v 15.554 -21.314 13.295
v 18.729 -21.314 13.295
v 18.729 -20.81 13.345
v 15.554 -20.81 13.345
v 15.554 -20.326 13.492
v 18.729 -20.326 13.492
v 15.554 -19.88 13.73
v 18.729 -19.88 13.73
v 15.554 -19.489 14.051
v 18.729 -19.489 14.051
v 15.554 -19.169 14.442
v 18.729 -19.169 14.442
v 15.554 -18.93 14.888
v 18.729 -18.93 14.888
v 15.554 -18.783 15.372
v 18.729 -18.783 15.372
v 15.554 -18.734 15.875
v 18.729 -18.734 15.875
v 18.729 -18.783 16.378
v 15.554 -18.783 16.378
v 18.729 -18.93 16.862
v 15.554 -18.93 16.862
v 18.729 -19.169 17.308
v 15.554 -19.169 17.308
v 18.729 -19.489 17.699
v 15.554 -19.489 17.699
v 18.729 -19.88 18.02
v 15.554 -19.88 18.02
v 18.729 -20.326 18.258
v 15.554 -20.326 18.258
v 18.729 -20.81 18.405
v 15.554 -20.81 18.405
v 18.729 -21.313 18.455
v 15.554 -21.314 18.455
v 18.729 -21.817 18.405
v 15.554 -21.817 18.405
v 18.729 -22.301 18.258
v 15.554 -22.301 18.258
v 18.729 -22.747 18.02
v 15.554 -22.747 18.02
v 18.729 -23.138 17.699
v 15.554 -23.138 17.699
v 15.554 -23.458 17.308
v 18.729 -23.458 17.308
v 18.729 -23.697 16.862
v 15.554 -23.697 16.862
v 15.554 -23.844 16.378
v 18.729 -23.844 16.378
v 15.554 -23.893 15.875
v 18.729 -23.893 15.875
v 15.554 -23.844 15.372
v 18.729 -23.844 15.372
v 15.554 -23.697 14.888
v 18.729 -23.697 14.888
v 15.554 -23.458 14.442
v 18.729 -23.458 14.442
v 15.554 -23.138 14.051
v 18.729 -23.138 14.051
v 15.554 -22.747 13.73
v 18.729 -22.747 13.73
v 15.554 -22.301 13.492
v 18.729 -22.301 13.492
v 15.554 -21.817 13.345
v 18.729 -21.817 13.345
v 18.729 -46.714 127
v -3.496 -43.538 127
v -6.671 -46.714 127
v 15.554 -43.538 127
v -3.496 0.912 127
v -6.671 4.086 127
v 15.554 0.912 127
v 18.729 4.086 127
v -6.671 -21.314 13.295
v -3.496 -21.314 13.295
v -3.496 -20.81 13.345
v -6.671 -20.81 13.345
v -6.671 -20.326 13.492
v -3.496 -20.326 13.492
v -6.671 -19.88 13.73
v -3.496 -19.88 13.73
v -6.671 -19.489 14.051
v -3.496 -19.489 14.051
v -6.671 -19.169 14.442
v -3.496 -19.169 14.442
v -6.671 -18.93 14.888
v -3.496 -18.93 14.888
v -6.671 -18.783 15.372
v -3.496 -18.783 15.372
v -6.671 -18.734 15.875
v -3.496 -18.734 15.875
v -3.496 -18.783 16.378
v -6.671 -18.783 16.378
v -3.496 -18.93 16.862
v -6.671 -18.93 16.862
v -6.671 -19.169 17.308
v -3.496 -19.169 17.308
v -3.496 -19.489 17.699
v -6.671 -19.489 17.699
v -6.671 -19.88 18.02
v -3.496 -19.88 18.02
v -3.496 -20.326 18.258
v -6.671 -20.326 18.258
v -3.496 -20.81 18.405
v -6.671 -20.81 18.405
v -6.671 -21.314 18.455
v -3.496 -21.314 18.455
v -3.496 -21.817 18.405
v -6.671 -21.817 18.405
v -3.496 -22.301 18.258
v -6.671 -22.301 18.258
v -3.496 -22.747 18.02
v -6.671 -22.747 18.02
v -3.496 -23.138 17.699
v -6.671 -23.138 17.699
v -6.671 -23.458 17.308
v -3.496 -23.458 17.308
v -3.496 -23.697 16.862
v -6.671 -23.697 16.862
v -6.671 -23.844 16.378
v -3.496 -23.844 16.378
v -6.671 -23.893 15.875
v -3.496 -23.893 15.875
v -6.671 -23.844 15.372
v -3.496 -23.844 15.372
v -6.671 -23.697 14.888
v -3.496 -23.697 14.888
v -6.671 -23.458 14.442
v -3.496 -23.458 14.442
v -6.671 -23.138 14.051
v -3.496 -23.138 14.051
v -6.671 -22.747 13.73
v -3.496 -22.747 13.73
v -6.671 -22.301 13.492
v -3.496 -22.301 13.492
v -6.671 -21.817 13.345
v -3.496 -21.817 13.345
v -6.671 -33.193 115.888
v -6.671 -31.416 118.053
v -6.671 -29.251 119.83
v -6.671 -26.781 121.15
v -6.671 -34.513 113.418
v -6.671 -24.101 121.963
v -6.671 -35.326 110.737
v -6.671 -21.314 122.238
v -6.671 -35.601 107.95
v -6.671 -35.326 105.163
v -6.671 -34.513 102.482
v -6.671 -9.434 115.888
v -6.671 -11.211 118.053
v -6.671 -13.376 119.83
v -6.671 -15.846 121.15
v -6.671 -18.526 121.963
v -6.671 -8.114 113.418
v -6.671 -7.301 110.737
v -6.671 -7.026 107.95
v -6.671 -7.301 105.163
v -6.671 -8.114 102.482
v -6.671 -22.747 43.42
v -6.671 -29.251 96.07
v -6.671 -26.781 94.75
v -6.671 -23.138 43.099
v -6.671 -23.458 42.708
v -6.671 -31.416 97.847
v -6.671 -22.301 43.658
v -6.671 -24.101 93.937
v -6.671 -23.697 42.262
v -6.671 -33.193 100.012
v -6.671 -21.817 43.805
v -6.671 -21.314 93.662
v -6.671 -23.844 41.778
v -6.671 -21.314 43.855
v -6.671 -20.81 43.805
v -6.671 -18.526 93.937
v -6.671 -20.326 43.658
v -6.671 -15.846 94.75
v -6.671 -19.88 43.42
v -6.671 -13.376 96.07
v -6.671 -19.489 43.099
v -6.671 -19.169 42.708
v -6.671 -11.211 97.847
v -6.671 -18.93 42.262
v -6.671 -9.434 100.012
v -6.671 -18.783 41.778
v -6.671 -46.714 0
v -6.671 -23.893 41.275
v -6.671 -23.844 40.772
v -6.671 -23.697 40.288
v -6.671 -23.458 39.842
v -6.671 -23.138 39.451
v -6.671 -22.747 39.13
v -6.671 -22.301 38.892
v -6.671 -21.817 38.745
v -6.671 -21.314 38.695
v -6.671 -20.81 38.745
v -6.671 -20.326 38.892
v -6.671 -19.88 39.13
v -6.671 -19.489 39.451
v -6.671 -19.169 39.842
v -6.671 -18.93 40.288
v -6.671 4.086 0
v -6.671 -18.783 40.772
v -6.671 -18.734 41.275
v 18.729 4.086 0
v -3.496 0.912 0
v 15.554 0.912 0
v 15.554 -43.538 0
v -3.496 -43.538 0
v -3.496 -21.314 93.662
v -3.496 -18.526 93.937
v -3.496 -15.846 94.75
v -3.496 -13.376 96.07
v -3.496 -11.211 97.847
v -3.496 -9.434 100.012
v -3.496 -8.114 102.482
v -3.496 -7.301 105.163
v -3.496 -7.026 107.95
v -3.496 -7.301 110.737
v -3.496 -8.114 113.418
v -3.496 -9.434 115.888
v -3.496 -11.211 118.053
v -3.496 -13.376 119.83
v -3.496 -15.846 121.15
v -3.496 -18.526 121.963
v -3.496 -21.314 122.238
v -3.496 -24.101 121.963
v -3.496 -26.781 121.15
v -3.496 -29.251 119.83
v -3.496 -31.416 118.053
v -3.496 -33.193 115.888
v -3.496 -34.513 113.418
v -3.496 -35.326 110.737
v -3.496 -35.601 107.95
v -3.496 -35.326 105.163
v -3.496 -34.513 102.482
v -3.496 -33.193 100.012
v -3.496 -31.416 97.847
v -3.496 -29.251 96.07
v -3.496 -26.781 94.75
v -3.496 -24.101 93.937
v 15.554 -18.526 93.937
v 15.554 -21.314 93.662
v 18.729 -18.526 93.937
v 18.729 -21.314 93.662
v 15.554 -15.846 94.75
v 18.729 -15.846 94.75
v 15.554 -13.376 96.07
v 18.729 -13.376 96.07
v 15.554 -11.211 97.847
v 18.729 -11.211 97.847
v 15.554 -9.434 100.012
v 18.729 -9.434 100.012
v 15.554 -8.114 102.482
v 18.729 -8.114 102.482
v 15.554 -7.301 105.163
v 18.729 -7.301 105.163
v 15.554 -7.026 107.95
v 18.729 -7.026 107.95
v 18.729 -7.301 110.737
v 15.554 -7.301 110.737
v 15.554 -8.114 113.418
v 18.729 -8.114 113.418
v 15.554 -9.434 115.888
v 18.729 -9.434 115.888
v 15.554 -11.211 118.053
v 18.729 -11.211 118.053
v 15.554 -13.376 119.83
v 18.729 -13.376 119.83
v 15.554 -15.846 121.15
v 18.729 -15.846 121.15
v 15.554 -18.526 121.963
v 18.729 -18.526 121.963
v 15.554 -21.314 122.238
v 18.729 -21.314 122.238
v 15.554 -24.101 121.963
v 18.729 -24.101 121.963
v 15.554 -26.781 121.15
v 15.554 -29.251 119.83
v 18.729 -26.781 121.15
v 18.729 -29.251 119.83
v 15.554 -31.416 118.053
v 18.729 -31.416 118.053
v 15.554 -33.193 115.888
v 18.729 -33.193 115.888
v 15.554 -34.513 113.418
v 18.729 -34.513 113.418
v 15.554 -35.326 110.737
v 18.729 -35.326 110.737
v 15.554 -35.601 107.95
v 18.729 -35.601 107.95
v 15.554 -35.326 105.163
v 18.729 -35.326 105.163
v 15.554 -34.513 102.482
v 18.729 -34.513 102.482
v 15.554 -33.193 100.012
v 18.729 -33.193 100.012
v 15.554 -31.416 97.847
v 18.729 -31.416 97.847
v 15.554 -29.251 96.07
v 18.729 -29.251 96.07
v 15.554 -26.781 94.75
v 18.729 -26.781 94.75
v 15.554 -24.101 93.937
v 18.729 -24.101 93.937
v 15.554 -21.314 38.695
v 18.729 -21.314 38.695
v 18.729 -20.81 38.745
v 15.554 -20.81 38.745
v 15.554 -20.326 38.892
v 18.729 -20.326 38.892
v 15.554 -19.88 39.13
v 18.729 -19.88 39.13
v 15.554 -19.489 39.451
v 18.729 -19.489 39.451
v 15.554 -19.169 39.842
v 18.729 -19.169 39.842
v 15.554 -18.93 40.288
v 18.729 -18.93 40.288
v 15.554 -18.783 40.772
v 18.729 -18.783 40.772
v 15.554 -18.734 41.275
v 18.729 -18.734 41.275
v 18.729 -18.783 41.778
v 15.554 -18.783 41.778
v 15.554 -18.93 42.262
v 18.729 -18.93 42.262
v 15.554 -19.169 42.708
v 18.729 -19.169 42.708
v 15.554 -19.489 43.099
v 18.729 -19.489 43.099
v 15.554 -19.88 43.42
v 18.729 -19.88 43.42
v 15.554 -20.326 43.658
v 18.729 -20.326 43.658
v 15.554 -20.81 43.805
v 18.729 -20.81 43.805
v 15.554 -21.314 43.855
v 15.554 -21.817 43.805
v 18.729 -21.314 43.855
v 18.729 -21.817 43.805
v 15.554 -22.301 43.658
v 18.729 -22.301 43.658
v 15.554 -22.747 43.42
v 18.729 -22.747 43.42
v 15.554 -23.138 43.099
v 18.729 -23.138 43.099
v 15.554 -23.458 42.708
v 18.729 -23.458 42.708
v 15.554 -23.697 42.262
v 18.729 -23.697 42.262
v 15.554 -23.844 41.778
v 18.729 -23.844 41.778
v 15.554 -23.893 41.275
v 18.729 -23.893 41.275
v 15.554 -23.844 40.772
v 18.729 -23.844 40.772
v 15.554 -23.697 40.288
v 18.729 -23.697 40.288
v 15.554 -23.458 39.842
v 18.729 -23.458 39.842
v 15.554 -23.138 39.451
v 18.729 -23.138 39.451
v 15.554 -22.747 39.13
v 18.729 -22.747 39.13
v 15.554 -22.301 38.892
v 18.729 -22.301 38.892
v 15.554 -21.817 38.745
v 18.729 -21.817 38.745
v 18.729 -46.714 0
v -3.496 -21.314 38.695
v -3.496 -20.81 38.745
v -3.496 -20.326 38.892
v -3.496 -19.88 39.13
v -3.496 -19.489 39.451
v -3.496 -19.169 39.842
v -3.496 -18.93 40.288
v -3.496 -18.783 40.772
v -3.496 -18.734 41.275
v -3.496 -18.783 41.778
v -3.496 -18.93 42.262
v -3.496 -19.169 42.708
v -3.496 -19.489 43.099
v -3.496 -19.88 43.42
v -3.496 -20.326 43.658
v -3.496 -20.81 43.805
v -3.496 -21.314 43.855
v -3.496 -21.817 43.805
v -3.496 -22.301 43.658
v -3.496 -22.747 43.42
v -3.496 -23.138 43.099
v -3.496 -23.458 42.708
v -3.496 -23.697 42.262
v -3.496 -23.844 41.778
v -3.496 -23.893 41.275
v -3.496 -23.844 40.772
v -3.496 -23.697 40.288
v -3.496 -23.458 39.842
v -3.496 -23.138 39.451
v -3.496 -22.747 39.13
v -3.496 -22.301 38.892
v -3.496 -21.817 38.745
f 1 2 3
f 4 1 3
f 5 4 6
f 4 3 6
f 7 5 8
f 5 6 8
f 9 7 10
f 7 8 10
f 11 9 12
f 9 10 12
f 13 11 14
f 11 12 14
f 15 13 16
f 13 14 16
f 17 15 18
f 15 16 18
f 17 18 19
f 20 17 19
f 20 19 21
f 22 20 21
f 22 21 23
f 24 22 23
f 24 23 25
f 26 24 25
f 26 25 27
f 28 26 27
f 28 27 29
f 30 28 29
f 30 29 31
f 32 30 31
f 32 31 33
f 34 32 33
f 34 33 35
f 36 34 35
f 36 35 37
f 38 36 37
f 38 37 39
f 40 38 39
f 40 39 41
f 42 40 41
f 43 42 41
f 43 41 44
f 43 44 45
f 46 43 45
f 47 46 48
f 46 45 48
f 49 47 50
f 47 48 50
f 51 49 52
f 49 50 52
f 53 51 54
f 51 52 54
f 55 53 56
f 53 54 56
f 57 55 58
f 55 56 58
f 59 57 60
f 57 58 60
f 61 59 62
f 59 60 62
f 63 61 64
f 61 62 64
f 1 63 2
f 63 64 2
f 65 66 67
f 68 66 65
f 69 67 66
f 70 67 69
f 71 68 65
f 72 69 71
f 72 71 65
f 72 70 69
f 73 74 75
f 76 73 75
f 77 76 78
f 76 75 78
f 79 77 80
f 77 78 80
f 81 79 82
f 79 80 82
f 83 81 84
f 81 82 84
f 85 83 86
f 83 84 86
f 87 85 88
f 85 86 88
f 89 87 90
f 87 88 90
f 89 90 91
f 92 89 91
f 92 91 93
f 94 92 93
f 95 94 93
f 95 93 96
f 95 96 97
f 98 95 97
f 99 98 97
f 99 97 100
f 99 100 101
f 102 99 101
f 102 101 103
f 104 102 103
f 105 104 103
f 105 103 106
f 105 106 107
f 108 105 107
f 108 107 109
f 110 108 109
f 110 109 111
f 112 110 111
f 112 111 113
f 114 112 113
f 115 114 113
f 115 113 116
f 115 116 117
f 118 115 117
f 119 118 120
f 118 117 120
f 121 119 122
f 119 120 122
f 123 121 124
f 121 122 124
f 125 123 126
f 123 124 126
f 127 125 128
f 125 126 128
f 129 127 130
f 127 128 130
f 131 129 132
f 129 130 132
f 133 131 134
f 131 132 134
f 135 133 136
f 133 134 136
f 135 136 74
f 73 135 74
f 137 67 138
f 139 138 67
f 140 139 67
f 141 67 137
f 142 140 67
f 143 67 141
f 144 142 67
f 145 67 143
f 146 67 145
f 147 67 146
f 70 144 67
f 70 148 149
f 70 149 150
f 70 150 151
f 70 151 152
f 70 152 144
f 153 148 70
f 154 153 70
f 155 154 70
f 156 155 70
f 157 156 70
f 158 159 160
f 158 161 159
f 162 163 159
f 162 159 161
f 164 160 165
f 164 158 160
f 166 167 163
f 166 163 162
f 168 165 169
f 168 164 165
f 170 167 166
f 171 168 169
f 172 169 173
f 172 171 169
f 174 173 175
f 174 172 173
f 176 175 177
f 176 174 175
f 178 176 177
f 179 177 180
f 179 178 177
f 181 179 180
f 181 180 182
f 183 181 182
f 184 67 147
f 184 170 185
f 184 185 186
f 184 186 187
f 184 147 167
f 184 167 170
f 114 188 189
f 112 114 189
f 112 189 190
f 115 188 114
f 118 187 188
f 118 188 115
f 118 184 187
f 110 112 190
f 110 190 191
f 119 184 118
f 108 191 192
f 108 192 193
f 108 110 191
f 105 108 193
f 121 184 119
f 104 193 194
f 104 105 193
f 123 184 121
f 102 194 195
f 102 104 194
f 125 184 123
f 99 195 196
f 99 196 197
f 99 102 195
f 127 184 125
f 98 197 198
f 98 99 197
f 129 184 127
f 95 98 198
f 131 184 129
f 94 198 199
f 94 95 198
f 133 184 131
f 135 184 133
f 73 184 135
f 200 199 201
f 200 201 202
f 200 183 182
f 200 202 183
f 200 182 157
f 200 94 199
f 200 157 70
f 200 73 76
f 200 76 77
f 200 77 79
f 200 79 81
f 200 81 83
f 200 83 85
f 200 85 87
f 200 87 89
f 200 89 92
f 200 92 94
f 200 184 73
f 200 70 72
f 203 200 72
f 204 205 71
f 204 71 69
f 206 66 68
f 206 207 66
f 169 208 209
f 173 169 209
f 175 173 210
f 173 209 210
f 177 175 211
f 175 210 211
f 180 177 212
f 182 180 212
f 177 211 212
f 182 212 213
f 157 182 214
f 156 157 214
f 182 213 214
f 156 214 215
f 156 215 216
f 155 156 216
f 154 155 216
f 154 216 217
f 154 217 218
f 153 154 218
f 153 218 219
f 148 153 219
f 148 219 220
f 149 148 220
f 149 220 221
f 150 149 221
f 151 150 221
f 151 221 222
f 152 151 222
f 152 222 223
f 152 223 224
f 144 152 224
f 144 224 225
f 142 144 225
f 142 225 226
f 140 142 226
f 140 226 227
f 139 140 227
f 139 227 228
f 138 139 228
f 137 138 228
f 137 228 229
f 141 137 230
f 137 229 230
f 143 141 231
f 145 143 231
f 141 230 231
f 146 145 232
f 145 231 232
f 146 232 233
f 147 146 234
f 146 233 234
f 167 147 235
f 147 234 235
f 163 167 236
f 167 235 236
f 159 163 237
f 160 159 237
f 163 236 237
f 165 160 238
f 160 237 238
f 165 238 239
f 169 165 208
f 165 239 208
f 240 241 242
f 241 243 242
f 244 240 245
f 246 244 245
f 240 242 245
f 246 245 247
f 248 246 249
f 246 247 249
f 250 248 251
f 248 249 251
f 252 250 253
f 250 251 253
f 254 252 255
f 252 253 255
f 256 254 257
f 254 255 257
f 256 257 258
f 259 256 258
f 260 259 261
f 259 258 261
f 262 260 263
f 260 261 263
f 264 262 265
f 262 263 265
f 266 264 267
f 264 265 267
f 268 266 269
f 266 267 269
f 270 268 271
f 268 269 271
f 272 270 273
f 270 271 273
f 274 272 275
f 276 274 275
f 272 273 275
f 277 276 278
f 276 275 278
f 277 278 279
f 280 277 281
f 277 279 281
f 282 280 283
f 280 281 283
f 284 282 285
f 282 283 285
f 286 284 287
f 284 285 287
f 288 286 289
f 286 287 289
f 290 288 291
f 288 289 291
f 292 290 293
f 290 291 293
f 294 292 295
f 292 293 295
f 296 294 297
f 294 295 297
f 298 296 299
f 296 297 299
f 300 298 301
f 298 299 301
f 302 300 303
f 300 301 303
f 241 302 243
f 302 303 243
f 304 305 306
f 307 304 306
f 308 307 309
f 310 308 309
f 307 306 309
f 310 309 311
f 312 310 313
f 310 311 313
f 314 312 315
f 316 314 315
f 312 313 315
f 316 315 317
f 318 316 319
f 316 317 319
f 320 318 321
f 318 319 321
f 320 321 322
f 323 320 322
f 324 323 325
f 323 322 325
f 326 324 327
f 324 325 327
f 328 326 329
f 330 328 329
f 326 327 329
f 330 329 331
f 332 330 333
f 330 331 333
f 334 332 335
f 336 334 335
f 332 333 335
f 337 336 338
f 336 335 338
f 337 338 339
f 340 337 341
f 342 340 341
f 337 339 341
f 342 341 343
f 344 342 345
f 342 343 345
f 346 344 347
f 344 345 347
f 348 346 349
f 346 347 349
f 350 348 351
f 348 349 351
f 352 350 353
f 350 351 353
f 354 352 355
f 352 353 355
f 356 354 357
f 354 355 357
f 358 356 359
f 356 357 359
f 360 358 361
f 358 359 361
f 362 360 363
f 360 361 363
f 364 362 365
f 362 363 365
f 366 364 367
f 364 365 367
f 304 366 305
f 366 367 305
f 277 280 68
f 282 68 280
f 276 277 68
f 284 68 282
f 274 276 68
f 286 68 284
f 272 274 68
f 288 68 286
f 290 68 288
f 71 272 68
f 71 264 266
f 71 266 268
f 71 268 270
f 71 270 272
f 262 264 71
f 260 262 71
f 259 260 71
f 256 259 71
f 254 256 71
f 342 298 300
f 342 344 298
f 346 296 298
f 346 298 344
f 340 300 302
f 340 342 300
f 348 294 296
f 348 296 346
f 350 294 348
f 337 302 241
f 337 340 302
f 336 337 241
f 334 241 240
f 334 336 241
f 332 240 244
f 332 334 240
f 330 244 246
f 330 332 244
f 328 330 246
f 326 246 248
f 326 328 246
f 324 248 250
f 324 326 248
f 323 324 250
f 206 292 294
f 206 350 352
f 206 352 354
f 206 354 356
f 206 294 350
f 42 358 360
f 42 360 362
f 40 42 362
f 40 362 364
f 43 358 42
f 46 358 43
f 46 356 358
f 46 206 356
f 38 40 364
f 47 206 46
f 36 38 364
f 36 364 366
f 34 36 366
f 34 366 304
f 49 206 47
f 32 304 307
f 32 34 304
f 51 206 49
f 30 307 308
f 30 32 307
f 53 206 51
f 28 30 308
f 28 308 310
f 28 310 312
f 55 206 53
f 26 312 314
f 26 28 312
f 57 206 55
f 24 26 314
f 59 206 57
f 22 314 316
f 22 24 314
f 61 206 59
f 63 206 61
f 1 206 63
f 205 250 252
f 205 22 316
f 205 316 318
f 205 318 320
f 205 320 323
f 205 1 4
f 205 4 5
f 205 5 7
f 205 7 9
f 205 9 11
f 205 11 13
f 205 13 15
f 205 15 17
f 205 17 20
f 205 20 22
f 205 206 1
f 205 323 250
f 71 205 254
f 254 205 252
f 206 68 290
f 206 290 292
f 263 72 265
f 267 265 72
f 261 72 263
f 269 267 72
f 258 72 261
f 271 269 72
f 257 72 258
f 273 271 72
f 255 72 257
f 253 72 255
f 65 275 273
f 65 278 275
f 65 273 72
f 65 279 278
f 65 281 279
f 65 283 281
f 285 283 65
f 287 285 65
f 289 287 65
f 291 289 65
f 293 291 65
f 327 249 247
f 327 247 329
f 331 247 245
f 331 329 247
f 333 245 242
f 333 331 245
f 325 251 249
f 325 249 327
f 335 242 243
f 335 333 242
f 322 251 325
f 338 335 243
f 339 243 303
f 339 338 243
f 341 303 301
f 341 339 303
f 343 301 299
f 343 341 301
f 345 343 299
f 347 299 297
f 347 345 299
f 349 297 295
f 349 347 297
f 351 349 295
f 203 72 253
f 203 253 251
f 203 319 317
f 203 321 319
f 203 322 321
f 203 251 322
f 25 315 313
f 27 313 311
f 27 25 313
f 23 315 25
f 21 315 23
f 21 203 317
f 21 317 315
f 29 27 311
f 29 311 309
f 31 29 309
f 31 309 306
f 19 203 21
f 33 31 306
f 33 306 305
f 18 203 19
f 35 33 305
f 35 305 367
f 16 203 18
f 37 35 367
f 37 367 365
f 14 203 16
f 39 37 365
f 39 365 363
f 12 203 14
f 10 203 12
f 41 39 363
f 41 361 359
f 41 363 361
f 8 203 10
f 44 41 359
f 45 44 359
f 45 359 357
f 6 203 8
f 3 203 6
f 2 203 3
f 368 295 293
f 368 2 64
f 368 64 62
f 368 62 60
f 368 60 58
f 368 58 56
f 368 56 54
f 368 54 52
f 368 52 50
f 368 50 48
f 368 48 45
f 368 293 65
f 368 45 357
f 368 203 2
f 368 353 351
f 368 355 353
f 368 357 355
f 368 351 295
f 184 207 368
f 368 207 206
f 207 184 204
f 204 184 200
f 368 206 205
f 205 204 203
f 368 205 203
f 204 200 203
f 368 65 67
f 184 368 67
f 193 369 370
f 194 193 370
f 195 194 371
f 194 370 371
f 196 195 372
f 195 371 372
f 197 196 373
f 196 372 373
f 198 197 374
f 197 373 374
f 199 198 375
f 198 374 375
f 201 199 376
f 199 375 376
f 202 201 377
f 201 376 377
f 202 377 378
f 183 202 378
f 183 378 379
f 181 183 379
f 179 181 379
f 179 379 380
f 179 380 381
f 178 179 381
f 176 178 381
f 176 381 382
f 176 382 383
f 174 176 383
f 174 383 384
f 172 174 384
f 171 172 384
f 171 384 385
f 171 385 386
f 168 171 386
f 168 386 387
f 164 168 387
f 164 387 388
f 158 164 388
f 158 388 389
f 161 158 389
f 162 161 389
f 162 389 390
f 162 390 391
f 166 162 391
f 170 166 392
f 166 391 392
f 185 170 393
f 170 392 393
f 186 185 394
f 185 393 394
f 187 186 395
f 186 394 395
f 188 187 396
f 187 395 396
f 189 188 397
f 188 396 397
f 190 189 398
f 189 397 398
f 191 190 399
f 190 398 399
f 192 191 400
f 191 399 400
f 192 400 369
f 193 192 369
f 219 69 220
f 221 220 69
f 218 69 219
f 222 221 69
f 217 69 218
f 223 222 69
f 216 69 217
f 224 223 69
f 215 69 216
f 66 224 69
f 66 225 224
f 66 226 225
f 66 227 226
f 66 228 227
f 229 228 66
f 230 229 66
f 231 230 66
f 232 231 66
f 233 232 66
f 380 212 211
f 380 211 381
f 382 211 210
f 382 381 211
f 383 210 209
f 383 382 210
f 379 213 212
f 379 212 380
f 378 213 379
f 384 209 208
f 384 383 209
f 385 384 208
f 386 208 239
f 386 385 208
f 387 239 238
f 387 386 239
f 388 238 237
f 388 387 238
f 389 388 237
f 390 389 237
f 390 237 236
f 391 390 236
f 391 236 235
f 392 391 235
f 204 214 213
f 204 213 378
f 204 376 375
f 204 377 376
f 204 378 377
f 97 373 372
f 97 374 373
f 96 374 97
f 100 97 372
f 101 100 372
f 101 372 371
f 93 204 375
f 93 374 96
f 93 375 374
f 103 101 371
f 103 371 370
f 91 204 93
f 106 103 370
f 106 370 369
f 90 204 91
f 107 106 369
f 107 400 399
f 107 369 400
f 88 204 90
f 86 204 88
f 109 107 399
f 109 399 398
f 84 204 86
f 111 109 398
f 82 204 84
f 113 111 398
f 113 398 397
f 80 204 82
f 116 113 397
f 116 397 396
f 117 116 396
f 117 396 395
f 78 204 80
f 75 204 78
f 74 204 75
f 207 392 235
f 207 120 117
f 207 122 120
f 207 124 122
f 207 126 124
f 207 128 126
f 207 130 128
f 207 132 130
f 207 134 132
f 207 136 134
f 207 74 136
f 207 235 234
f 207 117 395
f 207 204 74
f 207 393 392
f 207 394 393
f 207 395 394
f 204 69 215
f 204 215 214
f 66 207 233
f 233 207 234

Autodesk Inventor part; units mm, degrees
ref_plane "YZ Plane" through (0, 0, 0) normal (1, 0, 0) x (0, 1, 0)
ref_plane "XZ Plane" through (0, 0, 0) normal (0, 1, 0) x (-1, 0, 0)
ref_plane "XY Plane" through (0, 0, 0) normal (0, 0, 1) x (1, 0, 0)
sketch "Sketch1" plane through (0, 0, 0) normal (0, 0, 1) x (1, 0, 0)
  line L0 (-6.6707, 4.0865) -> (18.7293, 4.0865)
  line L1 (18.7293, 4.0865) -> (18.7293, -46.7135)
  line L2 (18.7293, -46.7135) -> (-6.6707, -46.7135)
  line L3 (-6.6707, -46.7135) -> (-6.6707, 4.0865)
  line L4 (15.5543, 0.9115) -> (-3.4957, 0.9115)
  line L5 (-3.4957, 0.9115) -> (-3.4957, -43.5385)
  line L6 (-3.4957, -43.5385) -> (15.5543, -43.5385)
  line L7 (15.5543, -43.5385) -> (15.5543, 0.9115)
  point P0 (0, 0)
  dimension "d0" = 25.4
  dimension "d1" = 50.8
  dimension "d2" = 3.175
extrude "Extrusion1" add sketch "Sketch1" along normal blind 127
sketch "Sketch2" plane through (18.7293, -46.7135, 0) normal (1, 0, 0) x (0, 0, -1)
  line L0 (0, 47.625) -> (0, 3.175) projected
  line L1 (0, 25.4) -> (-107.95, 25.4)
  circle A0 centre (-107.95, 25.4) radius 14.2875
  point P0 (0, 46.7135)
  dimension "d5" = 107.95
  dimension "d6" = 28.575
extrude "Extrusion2" cut sketch "Sketch2" against normal blind 101.6
sketch "Sketch3" plane through (18.7293, -46.7135, 0) normal (1, 0, 0) x (0, 0, -1)
  line L0 (0, 47.625) -> (0, 3.175) projected
  line L1 (0, 25.4) -> (-15.875, 25.4)
  line L2 (-15.875, 25.4) -> (-41.275, 25.4)
  circle A0 centre (-15.875, 25.4) radius 2.5797
  circle A1 centre (-41.275, 25.4) radius 2.5797
  point P0 (0, 46.7135)
  dimension "d9" = 15.875
  dimension "d10" = 25.4
  dimension "d11" = 5.1594
  dimension "d12" = 5.1594
extrude "Extrusion3" cut sketch "Sketch3" against normal blind 101.6
properties part number "Gearbox Shaft Stabilizer"
